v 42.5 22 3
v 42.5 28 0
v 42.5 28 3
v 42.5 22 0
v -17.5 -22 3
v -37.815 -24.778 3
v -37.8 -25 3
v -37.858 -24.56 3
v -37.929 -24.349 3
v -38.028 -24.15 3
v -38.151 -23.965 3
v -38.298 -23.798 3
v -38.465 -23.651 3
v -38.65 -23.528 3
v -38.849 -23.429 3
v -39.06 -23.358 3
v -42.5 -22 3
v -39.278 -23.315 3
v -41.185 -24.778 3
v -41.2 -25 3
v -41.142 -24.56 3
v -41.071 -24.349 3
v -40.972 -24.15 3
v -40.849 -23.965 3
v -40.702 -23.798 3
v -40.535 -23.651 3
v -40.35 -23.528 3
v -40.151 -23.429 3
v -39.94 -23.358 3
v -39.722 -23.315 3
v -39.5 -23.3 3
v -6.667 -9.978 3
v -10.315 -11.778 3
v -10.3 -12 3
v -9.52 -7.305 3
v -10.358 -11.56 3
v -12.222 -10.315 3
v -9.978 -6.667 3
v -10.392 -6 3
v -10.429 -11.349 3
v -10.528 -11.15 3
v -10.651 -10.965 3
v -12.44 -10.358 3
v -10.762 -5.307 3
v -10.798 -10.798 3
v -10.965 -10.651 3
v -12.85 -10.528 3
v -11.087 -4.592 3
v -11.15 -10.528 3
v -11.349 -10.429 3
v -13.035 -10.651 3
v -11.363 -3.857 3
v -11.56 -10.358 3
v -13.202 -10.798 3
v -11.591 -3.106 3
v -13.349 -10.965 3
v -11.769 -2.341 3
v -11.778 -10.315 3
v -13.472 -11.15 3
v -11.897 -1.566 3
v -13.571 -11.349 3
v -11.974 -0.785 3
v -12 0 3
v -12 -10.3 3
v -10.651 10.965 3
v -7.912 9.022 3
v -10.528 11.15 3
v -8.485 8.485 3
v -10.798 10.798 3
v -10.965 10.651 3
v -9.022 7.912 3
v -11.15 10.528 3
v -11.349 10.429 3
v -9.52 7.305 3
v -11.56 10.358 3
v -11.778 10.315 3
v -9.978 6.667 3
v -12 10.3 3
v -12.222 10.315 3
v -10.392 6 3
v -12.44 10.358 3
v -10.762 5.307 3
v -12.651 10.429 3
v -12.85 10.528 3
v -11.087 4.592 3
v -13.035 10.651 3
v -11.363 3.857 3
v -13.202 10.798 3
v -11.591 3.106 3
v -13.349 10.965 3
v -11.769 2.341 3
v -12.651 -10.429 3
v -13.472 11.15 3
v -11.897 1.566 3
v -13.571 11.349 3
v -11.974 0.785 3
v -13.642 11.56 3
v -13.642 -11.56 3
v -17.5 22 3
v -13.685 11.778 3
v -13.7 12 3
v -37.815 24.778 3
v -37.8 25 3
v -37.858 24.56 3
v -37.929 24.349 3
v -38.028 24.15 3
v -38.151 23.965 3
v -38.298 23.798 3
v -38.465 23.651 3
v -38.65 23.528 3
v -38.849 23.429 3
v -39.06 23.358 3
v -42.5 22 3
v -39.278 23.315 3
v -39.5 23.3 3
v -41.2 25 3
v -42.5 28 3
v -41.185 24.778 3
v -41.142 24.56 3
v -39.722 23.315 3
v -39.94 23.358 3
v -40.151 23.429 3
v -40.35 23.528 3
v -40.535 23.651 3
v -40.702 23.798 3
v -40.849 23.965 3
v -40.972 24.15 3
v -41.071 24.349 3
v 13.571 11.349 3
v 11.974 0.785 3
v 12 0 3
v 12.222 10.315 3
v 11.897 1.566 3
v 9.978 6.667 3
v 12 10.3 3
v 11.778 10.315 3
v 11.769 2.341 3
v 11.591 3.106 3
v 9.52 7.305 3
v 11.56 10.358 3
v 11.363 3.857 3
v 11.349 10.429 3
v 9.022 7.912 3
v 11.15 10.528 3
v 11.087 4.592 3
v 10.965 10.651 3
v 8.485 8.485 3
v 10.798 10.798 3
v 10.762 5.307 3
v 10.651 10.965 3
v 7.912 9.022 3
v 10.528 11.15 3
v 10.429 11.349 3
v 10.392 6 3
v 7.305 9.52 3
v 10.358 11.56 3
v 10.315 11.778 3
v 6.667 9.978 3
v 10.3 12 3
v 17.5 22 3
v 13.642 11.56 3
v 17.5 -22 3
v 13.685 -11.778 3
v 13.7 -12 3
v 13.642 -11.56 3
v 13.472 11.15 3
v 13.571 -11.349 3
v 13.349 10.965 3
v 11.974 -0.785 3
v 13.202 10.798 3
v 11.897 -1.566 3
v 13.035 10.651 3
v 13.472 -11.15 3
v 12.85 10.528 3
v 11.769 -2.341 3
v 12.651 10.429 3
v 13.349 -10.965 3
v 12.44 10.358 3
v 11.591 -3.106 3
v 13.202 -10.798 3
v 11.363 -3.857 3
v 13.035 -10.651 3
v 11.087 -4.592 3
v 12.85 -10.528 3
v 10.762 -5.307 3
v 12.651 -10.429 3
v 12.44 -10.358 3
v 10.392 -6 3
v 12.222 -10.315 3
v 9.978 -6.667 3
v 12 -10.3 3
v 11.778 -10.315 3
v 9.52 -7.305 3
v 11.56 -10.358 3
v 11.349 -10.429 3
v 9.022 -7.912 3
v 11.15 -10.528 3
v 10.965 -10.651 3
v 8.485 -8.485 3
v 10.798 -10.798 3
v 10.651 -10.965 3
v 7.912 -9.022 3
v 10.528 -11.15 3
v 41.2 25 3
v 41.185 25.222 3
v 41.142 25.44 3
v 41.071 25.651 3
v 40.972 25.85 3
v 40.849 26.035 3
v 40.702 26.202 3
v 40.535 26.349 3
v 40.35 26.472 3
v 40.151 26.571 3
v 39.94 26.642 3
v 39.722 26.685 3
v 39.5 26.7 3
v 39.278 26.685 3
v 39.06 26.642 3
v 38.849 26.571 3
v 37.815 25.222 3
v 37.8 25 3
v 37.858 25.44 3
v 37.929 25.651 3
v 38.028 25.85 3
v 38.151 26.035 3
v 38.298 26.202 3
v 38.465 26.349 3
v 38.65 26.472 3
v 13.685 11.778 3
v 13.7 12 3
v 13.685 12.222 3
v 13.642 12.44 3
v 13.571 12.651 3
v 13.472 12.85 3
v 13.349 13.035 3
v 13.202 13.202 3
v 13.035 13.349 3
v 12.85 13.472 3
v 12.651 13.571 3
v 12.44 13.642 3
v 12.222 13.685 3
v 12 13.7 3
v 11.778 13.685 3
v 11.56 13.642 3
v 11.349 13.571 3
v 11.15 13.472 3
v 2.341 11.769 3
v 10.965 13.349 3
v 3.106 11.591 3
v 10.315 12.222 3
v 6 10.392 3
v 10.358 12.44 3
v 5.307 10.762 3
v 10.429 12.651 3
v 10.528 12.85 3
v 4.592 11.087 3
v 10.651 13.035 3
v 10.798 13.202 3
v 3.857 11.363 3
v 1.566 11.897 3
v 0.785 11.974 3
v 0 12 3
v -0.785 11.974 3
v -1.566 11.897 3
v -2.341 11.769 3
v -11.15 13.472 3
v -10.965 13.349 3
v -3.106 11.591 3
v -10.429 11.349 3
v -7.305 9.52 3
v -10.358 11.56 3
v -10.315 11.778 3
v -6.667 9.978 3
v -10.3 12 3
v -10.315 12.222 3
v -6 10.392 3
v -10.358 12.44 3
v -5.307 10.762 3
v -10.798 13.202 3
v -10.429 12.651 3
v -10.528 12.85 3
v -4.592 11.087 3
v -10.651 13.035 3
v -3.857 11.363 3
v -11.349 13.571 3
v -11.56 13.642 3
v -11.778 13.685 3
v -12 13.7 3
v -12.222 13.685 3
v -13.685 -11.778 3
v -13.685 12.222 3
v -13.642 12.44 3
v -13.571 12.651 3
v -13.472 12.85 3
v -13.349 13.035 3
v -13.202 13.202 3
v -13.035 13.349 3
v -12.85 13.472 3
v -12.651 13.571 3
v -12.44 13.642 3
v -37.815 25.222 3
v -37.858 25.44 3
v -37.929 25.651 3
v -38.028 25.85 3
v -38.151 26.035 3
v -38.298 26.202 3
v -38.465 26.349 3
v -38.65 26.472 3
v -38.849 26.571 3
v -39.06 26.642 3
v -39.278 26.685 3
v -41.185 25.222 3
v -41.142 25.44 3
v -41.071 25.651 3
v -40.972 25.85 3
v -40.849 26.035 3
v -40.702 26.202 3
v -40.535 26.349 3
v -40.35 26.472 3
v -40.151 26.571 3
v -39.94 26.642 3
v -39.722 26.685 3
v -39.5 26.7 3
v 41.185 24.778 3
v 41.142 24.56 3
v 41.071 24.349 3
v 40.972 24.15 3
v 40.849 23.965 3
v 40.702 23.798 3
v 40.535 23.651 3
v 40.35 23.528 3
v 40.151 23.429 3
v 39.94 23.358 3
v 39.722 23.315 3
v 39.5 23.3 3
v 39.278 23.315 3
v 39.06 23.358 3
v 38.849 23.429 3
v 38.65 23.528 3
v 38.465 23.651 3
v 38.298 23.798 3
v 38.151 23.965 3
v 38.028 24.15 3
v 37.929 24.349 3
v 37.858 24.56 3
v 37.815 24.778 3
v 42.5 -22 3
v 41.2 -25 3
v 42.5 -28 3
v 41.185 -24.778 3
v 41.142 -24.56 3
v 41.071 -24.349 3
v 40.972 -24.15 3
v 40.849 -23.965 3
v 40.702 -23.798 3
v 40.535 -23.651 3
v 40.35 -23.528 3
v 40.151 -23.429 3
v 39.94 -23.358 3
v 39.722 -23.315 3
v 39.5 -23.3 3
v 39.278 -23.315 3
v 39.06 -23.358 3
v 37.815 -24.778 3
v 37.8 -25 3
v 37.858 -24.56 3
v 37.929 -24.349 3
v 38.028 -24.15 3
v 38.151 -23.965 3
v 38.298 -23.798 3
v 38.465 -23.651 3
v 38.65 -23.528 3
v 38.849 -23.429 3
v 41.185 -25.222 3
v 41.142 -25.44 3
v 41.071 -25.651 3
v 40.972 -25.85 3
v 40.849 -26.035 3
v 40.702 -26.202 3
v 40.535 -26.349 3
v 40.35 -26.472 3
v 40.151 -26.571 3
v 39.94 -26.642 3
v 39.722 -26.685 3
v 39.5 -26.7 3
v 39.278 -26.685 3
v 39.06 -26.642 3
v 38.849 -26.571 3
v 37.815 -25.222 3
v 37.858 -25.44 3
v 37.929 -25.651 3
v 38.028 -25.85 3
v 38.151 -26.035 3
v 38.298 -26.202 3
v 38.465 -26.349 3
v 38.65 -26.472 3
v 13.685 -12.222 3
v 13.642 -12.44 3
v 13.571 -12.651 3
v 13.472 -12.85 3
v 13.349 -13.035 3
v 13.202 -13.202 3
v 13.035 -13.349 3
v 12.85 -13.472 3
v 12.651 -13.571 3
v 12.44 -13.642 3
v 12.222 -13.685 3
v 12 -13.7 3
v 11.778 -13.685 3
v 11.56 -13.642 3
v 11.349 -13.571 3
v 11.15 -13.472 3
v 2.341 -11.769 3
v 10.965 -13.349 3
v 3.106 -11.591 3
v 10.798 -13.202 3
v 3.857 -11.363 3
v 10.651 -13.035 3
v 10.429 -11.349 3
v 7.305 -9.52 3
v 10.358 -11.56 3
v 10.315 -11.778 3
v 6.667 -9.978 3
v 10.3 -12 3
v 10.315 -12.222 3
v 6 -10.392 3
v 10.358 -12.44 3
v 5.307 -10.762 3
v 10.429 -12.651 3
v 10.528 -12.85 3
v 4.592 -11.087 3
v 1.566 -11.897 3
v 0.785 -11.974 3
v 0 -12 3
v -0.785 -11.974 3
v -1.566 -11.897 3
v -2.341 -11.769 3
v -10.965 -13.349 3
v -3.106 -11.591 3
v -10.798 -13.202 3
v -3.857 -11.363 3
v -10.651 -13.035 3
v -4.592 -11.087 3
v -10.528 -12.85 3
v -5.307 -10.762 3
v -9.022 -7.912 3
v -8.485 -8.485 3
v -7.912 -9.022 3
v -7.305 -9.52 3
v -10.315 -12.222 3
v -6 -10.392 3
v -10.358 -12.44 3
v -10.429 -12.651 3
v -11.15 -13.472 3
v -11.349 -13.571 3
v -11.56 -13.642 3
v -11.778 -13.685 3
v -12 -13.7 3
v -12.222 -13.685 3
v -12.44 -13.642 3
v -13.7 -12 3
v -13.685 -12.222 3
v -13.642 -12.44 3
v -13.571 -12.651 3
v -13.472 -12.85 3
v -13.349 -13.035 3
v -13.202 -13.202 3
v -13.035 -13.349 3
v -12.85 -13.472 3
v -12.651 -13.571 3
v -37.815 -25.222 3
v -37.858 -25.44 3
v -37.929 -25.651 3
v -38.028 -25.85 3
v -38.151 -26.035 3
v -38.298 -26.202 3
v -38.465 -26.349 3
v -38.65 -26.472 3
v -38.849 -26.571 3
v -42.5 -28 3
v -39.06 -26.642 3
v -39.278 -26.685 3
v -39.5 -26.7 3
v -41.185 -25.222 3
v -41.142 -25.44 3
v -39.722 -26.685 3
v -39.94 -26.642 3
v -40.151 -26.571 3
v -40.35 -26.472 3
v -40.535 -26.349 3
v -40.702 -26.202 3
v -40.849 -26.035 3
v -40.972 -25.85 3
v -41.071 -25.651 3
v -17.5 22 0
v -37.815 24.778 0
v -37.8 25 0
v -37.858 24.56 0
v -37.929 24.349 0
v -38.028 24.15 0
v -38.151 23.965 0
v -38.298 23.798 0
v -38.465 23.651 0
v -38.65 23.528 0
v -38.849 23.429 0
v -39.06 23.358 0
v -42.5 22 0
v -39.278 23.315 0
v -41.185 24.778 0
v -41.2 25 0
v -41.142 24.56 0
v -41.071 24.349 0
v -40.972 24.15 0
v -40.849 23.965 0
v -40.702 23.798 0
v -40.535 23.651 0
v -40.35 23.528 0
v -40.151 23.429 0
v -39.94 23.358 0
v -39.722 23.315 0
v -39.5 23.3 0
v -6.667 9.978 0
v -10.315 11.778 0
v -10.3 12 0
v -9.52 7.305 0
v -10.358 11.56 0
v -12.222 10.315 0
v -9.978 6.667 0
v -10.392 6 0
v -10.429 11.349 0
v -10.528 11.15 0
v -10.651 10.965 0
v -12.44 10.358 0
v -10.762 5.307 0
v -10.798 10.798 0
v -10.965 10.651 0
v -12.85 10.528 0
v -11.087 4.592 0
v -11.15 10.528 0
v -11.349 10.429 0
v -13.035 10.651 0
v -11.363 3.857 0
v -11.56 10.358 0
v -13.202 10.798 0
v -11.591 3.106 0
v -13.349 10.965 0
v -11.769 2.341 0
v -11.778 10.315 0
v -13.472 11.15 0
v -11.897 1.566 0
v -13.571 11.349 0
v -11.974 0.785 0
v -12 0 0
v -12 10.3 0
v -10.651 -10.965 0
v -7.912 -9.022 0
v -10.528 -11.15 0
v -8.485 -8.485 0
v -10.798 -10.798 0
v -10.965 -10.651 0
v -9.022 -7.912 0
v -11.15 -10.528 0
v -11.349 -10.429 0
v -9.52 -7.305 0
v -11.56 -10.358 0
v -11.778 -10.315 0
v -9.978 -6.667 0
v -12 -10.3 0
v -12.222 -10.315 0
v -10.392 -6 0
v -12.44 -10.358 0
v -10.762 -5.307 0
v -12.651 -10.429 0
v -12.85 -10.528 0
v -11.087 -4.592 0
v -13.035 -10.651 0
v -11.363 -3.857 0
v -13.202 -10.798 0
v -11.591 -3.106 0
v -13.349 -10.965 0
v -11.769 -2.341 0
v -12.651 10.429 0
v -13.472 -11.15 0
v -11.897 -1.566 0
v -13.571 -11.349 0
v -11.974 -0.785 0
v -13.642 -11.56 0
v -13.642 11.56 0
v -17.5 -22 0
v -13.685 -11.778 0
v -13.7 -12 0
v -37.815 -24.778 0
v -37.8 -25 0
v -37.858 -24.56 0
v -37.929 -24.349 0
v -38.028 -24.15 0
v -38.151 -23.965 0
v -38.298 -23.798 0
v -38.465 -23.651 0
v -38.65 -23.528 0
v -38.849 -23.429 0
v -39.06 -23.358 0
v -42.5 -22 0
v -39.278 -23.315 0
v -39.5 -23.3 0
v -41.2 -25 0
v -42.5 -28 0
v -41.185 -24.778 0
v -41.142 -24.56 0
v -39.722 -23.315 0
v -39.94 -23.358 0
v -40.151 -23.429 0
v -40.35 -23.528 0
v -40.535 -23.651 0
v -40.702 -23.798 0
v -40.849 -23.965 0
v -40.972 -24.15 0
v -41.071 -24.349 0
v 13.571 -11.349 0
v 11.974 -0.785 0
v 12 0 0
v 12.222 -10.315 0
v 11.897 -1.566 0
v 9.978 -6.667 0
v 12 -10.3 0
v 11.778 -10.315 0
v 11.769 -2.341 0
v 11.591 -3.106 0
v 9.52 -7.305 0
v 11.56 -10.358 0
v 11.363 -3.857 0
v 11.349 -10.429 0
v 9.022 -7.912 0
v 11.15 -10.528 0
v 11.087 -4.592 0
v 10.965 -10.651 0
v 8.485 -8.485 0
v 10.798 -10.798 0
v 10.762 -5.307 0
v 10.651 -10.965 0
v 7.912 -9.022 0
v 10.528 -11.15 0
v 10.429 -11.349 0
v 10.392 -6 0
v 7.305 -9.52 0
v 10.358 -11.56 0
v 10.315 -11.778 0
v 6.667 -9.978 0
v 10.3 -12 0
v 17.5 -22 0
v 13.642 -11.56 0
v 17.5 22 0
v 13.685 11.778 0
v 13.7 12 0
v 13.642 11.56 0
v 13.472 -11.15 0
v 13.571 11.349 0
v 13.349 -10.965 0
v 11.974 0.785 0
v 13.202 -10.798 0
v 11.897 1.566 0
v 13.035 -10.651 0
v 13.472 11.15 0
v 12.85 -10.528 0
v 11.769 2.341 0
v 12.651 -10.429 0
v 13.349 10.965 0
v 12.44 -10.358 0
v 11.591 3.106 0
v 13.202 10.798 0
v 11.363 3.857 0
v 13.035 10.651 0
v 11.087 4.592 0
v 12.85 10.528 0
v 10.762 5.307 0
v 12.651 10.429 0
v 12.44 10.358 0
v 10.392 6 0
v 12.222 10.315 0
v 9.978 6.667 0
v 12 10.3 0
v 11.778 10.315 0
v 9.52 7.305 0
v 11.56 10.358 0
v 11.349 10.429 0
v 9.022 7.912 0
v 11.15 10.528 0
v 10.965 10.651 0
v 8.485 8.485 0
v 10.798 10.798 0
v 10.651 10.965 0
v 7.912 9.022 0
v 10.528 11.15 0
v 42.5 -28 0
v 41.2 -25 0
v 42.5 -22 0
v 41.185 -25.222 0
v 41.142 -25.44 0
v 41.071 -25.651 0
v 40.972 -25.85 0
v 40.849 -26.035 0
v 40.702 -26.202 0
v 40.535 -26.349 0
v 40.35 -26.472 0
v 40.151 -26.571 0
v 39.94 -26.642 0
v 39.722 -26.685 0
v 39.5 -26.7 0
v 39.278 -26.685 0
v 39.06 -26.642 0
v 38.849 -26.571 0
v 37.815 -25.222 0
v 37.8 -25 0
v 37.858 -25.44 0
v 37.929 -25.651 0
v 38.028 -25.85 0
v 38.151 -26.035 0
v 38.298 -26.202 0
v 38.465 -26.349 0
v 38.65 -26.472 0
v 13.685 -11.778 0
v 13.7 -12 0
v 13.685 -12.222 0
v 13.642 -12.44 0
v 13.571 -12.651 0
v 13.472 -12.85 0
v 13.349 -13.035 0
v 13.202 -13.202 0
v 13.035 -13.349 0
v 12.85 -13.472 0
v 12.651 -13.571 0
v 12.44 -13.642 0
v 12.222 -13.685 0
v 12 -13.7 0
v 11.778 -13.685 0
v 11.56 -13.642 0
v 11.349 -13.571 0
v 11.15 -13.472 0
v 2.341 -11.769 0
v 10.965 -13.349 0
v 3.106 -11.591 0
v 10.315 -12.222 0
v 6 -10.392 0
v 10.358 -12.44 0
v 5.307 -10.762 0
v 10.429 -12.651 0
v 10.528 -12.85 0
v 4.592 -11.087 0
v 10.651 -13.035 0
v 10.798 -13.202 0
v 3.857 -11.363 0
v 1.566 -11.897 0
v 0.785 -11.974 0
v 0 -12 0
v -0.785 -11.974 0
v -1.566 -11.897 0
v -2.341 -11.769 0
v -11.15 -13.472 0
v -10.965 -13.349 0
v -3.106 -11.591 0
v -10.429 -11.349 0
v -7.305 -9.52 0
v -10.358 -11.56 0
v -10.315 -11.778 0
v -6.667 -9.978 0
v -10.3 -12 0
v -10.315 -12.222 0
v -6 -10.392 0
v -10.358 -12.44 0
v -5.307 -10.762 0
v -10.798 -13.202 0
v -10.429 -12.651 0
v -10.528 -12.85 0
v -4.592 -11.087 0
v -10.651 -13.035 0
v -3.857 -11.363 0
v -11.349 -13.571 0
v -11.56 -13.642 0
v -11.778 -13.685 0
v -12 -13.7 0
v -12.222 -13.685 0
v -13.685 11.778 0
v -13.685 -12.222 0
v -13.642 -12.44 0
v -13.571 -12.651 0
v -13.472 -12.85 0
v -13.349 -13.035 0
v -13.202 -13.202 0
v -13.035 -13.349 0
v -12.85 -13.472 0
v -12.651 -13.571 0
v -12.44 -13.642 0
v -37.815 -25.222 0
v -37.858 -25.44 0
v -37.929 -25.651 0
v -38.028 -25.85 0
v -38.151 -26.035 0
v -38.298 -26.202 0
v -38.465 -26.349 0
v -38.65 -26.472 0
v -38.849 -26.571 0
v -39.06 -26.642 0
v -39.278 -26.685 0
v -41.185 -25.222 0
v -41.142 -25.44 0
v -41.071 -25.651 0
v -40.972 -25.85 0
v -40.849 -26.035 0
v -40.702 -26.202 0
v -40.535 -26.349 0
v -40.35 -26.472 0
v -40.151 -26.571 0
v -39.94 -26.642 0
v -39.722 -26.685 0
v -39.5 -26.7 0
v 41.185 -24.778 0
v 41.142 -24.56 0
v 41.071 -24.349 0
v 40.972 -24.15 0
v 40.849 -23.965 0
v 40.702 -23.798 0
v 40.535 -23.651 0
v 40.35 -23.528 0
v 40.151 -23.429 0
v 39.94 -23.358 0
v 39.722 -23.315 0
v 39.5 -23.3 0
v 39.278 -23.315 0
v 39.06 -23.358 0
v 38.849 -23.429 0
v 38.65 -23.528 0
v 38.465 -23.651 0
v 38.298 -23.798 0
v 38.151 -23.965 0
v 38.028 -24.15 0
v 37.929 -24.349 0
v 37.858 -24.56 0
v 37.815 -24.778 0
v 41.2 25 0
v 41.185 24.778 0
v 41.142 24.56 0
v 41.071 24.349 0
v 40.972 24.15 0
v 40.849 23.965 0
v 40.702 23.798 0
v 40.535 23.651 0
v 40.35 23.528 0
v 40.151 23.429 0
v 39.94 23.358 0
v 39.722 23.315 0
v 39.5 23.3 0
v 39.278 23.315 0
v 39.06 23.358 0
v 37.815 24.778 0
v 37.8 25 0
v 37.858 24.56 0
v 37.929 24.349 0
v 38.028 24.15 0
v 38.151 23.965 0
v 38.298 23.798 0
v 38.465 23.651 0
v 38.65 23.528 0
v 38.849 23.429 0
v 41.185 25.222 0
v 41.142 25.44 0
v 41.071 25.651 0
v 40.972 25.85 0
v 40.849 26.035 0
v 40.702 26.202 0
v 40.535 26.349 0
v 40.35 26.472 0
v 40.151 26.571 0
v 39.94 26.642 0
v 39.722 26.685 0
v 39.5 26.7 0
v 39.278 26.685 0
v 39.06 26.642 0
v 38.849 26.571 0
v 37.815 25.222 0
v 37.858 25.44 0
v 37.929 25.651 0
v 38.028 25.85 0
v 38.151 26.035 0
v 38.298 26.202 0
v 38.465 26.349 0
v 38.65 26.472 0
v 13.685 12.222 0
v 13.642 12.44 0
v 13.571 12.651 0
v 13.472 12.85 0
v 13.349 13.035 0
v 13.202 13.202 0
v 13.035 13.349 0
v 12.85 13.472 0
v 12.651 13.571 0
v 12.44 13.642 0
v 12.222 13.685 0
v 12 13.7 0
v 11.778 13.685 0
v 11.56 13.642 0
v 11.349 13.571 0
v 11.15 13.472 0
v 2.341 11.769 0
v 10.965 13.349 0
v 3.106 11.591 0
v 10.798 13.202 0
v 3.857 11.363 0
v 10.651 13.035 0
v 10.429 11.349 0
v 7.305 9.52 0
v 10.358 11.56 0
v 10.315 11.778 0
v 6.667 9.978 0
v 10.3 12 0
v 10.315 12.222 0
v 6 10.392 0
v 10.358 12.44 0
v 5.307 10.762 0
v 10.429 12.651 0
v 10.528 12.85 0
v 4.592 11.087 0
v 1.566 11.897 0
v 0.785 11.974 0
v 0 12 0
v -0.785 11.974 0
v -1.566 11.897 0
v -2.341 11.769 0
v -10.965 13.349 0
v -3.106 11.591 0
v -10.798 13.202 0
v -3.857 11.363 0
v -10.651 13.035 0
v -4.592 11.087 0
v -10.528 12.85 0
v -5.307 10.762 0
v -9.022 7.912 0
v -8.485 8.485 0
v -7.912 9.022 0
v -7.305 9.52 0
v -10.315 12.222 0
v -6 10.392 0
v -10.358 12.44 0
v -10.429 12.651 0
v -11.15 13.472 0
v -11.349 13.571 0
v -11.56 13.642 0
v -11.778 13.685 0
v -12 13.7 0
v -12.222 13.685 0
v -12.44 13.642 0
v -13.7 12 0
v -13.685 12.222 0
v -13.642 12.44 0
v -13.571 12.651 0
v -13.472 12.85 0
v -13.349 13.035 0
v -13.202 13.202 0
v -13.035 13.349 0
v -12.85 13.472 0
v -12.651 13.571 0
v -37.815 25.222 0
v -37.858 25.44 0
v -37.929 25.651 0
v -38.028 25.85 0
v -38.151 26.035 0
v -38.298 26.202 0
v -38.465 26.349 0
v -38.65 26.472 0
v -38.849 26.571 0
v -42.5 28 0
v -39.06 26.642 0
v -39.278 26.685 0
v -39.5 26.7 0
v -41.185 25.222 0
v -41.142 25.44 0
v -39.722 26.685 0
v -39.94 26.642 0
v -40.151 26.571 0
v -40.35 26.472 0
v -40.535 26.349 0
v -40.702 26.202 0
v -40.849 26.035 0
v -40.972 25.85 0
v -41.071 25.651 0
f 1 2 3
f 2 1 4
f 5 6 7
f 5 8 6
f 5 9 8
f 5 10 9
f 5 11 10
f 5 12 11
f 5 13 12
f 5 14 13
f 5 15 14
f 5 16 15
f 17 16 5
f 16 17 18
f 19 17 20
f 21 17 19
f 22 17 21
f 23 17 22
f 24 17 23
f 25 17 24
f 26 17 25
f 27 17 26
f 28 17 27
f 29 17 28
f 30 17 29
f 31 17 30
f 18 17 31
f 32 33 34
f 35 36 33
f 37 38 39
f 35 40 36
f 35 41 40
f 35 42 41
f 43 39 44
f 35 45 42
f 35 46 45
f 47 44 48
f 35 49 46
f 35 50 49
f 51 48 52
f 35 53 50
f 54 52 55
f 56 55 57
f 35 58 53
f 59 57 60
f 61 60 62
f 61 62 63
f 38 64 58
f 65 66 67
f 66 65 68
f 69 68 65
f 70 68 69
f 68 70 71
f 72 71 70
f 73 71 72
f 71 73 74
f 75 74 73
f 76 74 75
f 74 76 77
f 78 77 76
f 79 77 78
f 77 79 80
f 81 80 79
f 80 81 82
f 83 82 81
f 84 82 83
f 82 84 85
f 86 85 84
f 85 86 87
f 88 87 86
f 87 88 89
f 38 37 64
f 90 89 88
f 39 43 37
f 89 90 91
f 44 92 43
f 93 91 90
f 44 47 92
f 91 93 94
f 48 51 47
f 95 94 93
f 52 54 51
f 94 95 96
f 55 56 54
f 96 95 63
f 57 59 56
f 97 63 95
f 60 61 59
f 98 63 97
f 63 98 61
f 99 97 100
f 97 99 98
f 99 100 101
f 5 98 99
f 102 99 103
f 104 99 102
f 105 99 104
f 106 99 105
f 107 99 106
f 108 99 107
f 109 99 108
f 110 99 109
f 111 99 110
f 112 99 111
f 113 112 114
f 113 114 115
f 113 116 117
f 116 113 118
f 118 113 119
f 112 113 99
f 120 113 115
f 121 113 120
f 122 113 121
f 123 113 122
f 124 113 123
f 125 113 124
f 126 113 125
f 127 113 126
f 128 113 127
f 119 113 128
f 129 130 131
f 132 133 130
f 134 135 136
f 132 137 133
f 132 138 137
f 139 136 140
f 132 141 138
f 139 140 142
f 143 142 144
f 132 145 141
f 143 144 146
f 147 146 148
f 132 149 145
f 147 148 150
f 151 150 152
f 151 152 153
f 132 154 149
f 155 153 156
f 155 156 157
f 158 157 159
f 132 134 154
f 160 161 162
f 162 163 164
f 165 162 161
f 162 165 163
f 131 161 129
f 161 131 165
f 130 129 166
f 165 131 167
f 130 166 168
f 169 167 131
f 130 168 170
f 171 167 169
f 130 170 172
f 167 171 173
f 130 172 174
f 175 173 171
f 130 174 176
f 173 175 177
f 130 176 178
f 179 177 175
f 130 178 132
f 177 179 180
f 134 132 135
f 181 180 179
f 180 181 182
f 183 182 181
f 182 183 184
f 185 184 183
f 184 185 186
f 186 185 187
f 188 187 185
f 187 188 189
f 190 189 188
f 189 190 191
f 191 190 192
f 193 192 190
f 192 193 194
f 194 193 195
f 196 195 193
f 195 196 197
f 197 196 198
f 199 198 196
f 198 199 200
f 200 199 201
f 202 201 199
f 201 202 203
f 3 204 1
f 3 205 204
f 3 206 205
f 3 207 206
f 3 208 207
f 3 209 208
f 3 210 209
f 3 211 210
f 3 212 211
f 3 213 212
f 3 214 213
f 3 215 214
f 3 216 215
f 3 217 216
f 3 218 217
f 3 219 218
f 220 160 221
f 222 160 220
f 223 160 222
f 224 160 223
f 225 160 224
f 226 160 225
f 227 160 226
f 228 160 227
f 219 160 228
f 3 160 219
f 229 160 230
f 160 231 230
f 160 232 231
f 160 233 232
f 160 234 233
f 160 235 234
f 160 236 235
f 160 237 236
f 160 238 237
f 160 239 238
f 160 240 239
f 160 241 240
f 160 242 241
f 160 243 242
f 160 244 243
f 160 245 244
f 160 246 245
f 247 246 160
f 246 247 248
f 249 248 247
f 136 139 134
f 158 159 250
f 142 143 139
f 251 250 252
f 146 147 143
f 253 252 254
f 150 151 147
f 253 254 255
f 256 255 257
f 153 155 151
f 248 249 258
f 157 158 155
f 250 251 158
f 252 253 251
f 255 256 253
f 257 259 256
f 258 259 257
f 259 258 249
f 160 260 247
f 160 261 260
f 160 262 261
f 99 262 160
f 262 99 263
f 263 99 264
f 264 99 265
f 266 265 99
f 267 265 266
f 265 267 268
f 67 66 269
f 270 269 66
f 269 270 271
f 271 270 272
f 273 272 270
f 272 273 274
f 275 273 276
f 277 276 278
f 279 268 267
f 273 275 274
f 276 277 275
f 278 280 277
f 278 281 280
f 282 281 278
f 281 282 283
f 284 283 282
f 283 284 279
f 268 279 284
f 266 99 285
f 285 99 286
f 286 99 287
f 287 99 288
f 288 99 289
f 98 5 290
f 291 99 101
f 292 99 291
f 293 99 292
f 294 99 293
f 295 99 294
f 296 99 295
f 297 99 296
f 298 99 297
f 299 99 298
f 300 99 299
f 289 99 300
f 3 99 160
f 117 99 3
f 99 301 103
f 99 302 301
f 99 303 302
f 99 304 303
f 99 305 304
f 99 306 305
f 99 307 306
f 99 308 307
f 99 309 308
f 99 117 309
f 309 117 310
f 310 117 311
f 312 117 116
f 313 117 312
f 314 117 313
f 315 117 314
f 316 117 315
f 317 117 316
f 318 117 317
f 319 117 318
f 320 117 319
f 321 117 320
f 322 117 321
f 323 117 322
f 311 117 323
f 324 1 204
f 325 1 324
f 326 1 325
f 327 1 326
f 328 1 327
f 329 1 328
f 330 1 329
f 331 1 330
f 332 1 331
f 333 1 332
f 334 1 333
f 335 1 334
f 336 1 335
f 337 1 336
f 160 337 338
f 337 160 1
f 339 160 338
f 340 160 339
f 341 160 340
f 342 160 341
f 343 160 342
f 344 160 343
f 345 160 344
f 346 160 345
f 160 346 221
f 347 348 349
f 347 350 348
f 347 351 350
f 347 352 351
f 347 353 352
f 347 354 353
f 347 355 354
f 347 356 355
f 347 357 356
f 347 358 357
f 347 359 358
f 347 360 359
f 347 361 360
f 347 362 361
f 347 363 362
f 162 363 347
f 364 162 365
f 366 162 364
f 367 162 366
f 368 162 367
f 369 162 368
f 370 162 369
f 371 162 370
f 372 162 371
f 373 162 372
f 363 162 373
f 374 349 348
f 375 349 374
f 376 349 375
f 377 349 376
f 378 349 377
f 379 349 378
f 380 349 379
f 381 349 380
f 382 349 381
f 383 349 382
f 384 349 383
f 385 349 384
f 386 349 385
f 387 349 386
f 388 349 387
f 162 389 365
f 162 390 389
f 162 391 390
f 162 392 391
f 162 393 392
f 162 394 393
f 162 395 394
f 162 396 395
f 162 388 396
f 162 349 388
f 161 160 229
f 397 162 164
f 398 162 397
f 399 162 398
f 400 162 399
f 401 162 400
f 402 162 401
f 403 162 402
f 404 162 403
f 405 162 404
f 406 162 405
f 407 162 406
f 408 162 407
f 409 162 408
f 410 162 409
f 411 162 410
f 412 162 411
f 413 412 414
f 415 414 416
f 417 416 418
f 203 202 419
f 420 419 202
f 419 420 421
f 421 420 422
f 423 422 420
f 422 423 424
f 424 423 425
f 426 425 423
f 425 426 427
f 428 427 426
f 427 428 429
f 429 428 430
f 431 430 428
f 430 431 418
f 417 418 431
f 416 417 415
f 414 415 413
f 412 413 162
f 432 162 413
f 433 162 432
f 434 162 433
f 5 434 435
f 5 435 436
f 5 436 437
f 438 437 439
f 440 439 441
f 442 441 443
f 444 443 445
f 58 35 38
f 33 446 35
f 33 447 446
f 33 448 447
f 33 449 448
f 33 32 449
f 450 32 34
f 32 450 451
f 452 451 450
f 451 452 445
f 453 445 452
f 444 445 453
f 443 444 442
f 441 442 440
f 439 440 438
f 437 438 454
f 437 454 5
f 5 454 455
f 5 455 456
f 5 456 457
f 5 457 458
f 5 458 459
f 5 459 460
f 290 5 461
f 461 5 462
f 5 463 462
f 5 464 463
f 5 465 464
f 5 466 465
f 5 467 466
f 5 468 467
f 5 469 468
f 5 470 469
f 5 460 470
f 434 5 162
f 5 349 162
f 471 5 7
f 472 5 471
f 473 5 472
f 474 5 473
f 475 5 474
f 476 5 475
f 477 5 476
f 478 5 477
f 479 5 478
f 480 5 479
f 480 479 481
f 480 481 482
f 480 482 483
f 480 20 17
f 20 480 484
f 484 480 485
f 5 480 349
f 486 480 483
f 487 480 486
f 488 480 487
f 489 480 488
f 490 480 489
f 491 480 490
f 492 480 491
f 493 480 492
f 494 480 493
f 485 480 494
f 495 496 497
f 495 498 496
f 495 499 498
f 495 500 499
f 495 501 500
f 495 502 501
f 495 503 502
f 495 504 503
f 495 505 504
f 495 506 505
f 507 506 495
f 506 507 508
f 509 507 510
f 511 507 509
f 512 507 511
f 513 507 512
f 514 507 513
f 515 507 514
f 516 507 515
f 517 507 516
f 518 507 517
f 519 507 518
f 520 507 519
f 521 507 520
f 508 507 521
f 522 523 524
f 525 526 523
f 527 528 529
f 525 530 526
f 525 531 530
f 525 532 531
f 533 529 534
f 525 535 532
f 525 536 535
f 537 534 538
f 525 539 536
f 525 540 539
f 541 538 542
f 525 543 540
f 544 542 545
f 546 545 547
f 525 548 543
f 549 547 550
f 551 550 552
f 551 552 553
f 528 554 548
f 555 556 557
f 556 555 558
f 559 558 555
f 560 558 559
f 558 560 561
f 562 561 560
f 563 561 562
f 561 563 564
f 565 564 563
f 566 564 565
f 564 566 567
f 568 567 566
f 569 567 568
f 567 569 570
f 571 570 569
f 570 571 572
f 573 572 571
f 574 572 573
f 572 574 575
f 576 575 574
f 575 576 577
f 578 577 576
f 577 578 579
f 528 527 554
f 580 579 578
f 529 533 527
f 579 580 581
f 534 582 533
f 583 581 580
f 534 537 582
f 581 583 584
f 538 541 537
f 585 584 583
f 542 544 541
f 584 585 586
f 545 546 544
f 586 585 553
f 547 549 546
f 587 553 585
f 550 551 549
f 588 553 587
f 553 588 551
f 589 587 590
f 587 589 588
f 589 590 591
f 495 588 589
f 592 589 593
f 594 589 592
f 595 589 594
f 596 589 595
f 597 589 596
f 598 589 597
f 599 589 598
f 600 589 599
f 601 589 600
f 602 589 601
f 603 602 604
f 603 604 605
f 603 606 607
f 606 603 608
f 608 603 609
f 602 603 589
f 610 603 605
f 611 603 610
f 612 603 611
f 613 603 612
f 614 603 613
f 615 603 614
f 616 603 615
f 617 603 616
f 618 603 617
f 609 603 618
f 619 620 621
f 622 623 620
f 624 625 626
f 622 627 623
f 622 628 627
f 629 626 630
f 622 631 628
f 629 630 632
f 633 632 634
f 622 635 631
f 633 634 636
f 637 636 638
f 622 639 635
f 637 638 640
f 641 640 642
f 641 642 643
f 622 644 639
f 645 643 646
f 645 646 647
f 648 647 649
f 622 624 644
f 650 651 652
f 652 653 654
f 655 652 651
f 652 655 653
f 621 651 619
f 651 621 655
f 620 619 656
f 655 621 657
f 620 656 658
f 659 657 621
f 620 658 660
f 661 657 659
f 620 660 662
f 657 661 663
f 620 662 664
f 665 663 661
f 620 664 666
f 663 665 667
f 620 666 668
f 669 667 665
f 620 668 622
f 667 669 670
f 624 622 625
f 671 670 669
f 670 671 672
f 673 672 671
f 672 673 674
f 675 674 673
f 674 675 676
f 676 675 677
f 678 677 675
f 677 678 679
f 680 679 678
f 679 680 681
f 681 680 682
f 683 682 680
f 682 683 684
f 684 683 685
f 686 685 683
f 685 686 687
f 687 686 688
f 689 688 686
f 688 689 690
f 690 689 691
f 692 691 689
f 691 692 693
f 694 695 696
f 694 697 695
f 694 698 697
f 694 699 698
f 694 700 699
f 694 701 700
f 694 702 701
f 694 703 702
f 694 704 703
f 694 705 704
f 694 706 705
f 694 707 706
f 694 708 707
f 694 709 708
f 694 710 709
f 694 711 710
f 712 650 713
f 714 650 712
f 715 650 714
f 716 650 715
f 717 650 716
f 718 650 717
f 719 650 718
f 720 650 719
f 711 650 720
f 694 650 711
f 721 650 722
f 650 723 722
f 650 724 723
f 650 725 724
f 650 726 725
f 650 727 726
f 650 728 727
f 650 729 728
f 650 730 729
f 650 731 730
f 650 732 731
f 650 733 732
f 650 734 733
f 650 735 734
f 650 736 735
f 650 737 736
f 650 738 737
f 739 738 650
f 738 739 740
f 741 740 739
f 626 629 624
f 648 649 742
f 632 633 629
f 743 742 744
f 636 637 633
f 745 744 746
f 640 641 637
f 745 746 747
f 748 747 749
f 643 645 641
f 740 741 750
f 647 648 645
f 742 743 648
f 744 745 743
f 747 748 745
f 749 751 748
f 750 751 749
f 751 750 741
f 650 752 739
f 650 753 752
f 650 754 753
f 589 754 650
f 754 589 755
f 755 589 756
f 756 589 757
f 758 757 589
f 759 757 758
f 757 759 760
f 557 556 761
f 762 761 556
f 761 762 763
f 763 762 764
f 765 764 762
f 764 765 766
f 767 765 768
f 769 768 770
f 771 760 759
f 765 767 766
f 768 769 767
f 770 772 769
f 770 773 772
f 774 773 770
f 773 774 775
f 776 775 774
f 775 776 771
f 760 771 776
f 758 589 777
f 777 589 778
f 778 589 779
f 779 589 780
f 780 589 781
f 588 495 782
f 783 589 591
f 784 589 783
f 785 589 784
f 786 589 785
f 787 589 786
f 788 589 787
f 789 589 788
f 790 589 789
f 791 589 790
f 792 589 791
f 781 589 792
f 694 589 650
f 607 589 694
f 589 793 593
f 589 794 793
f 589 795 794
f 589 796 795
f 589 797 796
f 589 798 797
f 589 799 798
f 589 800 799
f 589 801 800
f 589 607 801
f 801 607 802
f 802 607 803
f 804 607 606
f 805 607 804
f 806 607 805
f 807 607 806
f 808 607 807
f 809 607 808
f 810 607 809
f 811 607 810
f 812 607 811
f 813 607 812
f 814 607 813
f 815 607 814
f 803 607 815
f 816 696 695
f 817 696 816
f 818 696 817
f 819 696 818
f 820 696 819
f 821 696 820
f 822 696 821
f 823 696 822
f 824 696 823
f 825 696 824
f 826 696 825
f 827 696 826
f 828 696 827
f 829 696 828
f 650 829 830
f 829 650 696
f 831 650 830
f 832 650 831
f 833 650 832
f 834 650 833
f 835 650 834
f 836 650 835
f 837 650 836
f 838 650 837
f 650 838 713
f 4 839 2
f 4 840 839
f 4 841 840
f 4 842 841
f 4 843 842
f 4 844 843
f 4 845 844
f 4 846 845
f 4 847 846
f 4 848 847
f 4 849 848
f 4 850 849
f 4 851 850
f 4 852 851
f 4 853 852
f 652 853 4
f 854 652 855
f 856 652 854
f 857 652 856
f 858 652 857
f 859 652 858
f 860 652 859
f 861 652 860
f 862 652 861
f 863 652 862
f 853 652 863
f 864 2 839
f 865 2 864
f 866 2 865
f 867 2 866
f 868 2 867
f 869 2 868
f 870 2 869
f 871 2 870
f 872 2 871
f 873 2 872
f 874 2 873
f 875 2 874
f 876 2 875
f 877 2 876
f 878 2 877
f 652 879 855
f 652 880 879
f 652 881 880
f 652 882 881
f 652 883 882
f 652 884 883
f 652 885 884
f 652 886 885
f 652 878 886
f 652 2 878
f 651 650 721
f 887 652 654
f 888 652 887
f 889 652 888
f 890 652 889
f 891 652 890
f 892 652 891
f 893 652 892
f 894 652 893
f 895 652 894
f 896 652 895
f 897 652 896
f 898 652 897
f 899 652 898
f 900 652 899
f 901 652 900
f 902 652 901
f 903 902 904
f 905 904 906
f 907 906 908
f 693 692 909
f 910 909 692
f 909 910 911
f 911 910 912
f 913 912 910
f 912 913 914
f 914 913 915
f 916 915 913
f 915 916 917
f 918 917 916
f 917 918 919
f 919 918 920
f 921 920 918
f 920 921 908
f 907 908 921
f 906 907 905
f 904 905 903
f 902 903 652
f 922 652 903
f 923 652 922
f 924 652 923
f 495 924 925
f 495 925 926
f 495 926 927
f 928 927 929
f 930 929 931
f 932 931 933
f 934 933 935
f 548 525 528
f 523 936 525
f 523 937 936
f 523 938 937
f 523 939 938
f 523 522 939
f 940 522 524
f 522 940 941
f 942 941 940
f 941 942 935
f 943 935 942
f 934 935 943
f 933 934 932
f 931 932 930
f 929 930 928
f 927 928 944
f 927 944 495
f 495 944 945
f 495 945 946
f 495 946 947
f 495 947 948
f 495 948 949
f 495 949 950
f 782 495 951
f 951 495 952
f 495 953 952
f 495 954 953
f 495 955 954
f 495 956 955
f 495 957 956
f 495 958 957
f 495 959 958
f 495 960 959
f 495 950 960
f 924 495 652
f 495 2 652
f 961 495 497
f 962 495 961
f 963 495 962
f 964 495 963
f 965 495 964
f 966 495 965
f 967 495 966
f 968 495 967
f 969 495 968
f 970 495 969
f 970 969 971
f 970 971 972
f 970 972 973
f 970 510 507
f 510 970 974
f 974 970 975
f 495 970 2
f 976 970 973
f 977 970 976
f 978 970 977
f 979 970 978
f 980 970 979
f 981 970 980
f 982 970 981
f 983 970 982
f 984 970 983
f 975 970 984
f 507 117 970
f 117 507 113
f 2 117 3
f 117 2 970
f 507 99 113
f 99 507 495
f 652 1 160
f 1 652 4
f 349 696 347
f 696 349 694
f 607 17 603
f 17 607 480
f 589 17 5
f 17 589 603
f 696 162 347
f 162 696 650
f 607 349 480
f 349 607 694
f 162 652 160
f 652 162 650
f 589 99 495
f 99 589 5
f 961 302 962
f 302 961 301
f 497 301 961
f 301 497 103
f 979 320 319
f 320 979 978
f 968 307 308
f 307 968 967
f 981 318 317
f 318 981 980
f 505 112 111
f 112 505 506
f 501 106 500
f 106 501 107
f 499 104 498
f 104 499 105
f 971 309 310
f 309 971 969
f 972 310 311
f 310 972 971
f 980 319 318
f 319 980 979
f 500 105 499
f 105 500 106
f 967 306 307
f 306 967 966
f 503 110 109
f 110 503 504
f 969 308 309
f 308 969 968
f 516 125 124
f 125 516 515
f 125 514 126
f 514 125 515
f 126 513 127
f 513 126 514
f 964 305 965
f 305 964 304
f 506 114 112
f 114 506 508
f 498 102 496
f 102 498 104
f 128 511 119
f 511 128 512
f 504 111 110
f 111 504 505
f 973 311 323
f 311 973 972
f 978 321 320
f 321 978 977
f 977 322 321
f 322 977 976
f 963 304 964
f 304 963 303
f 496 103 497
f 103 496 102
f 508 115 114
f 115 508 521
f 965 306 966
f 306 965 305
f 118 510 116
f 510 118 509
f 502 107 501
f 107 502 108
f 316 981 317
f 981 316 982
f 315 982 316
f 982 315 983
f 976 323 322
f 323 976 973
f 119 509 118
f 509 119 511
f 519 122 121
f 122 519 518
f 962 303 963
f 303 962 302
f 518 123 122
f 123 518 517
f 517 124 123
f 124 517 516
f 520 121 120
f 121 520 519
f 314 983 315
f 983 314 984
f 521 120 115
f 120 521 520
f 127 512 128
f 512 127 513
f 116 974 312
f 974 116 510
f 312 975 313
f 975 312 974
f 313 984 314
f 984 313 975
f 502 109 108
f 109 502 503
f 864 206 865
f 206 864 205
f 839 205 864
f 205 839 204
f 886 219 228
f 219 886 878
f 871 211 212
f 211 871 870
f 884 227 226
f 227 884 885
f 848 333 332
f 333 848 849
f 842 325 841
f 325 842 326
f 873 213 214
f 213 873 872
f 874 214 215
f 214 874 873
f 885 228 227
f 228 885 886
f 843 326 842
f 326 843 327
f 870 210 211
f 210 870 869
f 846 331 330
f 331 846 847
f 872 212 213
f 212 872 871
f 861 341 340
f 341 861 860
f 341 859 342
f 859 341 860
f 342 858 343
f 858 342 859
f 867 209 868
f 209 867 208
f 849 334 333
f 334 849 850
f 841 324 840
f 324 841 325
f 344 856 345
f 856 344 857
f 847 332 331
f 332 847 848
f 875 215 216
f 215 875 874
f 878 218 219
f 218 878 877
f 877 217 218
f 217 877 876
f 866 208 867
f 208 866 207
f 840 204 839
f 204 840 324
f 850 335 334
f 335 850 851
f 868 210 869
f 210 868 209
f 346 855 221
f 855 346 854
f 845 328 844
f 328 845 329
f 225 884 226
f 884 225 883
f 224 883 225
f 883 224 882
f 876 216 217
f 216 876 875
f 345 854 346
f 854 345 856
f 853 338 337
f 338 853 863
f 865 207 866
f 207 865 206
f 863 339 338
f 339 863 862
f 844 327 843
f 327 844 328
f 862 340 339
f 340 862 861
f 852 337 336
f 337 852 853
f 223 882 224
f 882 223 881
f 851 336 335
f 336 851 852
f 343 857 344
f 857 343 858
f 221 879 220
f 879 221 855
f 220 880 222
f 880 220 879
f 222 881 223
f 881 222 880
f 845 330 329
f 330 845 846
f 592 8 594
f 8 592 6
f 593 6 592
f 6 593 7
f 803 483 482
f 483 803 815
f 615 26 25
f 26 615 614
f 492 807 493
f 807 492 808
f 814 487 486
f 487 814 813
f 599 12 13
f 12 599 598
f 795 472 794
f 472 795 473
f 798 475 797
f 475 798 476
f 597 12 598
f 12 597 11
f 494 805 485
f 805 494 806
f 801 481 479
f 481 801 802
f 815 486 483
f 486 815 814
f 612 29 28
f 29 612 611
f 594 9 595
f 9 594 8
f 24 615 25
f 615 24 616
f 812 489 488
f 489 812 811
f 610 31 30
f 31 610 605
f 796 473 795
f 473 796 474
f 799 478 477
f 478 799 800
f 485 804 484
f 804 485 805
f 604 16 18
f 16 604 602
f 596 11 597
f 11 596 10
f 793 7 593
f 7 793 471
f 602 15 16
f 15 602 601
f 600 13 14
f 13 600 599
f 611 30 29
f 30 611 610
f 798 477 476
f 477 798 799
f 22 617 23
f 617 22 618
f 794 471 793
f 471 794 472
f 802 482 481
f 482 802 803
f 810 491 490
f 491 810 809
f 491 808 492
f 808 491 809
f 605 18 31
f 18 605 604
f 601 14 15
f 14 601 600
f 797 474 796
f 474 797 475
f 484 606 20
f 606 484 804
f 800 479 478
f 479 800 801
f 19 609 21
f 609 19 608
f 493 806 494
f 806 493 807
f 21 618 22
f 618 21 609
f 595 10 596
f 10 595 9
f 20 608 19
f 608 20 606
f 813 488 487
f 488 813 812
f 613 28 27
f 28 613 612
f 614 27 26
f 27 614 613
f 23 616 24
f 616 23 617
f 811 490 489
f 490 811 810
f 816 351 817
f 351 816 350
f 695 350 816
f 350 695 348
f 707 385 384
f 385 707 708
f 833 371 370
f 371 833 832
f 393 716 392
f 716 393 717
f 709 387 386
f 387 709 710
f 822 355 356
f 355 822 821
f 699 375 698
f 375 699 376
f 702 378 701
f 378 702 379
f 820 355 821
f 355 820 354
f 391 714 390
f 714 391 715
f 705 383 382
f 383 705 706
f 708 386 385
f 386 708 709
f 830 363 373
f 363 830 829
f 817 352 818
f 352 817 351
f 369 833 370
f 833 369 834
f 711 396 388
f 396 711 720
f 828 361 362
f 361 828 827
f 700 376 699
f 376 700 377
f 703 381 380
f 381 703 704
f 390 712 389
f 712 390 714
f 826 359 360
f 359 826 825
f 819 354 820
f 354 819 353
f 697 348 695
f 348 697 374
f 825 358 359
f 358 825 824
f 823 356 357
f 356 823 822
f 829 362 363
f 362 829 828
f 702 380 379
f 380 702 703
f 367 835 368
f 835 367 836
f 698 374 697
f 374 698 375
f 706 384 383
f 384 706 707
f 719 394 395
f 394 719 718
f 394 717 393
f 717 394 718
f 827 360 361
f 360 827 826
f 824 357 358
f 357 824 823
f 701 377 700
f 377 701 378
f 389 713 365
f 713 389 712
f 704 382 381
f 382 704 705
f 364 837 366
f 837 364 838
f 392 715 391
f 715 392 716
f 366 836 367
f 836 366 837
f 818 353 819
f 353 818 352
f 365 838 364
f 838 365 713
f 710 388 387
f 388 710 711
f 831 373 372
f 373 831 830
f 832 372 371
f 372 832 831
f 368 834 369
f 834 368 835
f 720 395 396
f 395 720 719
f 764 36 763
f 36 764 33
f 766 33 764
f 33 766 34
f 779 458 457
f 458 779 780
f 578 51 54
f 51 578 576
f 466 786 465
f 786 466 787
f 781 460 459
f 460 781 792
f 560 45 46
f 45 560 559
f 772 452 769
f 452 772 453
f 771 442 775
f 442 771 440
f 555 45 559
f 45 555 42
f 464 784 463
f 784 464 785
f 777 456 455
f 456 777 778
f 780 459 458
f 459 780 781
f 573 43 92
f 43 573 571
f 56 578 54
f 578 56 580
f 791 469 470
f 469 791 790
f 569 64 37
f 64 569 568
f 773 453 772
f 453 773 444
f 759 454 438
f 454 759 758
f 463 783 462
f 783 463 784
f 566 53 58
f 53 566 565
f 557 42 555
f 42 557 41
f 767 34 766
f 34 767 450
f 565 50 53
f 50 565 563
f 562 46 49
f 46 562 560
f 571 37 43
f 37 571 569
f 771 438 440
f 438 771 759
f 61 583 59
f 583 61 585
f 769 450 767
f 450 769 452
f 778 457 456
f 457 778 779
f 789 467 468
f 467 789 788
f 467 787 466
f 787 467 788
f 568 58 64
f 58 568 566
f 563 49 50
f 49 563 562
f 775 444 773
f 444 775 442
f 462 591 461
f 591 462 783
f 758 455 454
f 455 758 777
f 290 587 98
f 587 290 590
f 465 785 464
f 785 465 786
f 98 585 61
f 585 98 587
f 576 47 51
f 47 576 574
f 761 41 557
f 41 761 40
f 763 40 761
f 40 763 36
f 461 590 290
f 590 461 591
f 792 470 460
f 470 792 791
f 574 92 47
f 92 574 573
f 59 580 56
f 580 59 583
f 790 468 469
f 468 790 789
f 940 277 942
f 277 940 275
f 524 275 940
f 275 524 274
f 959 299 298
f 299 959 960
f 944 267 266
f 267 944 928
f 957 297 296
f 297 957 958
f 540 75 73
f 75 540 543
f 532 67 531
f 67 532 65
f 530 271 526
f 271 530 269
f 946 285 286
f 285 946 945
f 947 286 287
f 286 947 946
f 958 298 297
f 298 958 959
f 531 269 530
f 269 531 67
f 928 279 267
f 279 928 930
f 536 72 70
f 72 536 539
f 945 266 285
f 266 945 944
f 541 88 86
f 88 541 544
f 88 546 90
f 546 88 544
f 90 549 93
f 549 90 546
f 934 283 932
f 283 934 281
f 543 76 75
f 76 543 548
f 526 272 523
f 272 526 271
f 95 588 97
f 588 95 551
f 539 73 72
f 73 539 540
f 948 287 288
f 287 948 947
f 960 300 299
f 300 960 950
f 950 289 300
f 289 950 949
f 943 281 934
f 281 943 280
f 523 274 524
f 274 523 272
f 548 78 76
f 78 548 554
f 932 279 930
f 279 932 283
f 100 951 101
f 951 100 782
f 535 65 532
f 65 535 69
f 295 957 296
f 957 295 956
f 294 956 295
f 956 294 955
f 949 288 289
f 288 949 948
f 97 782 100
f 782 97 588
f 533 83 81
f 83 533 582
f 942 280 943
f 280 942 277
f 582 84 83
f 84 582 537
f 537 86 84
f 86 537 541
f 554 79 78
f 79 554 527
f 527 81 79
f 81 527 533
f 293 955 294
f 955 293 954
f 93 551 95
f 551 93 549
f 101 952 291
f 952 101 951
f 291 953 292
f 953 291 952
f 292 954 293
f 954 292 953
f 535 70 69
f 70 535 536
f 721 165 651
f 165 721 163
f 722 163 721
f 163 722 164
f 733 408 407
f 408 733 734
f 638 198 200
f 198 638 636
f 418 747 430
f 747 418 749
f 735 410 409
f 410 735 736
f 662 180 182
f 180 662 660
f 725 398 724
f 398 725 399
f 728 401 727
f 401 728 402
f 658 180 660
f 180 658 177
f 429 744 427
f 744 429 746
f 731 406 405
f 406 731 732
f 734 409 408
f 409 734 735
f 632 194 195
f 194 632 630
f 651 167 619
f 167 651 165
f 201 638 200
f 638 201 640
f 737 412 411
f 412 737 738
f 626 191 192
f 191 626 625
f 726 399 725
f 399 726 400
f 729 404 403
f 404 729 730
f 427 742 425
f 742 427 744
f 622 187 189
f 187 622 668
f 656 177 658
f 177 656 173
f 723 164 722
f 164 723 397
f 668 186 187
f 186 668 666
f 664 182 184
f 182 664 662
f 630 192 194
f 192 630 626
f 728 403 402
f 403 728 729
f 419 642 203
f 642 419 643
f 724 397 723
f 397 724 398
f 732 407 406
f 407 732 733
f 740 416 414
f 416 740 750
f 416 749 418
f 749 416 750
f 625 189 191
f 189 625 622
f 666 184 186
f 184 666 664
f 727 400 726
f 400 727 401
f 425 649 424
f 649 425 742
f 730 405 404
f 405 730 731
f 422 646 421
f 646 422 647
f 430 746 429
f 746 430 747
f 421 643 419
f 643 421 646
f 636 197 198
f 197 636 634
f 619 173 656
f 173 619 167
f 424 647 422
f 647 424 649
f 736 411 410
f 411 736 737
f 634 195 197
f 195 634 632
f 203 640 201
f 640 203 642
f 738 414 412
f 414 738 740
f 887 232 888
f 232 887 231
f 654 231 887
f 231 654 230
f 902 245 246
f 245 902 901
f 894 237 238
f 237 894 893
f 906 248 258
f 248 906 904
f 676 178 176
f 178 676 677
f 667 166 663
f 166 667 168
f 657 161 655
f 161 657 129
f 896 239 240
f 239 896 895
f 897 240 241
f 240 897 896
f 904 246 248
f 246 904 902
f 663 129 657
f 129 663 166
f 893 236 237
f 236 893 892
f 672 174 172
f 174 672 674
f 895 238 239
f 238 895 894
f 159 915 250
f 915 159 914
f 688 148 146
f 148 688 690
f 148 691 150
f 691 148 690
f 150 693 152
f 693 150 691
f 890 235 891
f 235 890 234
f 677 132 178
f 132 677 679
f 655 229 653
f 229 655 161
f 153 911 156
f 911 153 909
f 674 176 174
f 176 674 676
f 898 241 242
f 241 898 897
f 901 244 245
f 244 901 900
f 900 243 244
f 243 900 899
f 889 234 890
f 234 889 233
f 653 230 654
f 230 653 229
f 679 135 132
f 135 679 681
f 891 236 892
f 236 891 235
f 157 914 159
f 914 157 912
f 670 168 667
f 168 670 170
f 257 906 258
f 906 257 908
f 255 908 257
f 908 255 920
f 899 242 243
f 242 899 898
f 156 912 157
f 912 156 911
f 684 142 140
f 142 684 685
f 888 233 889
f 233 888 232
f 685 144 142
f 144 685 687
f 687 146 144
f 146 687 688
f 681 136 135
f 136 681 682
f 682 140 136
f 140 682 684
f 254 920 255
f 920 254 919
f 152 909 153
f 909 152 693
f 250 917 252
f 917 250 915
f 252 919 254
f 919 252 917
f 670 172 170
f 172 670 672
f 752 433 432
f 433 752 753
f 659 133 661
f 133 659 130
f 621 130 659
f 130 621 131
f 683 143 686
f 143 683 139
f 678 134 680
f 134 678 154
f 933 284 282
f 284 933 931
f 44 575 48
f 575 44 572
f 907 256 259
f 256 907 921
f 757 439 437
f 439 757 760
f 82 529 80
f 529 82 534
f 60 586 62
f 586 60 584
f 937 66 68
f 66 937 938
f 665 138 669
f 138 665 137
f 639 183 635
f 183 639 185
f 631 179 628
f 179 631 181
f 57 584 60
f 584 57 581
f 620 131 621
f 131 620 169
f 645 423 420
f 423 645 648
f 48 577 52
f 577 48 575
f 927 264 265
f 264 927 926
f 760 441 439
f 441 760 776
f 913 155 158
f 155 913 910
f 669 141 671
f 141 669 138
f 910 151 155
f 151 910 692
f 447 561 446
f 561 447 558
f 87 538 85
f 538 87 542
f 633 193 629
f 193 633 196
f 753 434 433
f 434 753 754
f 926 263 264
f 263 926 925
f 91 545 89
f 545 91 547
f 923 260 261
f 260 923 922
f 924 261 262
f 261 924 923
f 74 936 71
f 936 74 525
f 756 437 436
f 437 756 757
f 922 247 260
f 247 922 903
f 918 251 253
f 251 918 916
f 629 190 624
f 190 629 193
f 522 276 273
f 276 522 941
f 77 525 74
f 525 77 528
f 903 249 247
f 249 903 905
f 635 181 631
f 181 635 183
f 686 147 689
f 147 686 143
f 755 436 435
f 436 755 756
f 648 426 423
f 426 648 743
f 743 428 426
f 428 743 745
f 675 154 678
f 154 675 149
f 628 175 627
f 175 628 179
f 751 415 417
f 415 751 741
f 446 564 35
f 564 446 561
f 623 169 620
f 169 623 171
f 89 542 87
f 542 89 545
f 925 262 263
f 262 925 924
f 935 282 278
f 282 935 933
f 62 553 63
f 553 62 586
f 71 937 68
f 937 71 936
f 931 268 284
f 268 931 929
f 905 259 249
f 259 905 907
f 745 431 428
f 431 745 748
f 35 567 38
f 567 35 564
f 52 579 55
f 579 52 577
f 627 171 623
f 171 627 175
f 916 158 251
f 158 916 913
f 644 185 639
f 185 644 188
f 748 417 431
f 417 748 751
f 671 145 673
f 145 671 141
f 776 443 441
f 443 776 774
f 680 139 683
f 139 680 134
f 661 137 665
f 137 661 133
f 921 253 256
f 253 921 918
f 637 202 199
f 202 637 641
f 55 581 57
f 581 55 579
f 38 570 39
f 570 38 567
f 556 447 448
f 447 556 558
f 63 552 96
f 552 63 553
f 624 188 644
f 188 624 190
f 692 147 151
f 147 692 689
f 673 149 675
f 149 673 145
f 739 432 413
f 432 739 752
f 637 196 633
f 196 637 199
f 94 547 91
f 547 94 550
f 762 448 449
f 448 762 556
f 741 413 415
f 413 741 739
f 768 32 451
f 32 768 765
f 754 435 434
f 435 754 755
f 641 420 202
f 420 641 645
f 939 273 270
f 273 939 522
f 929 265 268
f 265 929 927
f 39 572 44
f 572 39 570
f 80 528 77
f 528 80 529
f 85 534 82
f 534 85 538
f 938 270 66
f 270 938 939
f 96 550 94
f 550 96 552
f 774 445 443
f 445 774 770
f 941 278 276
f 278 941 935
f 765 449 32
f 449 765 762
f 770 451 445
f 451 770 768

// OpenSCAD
// POV 3D — 米联派 MLKPAI-FS03 ZYNQ H 形支架 (t=3), 居中坐标系 +Y 上
// 旋转 H: 上下满宽横梁 + 中间竖脊, 缺口开左右; 中间 5 孔居中 (0,0)
bw=85; bh=56; hx=bw/2; hy=bh/2;
slot_w=25; slot_h=44;       // 凹槽 左右宽 × 上下高 (两侧相同)
bar_in=slot_h/2;            // 22 上下横梁内缘 y (横梁各 6mm)
spine_x=hx-slot_w;         // 17.5 中脊半宽 (凹槽朝外开口)
cen=[0,0];                  // 中间 5 孔中心 (居中; 芯片实际在 0,+3.7)
cd=24; sq=24;               // Φ24 + 24 方阵
chx=39.5; chy=25;           // 角孔 |X|,|Y| —— 间距 79×50 (实测)
t=3; m3c=3.4; m3s=3.4;

module mlkpai_h_bracket() {
    difference() {
        union() {
            translate([-hx, bar_in, 0]) cube([bw, hy-bar_in, t]);     // top bar
            translate([-hx,-hy,0])      cube([bw, hy-bar_in, t]);     // bottom bar
            translate([-spine_x,-hy,0]) cube([2*spine_x, bh, t]);     // central spine
        }
        translate([cen[0],cen[1],-1]) cylinder(h=t+2, d=cd, $fn=96);  // Φ24 centred
        for (s=[[-chx,chy],[chx,chy],[-chx,-chy],[chx,-chy]])         // corner M3
            translate([s[0],s[1],-1]) cylinder(h=t+2, d=m3c, $fn=48);
        for (sx=[-1,1]) for (sy=[-1,1])                               // 24-square M3
            translate([cen[0]+sx*sq/2, cen[1]+sy*sq/2, -1]) cylinder(h=t+2, d=m3s, $fn=48);
    }
}
mlkpai_h_bracket();
